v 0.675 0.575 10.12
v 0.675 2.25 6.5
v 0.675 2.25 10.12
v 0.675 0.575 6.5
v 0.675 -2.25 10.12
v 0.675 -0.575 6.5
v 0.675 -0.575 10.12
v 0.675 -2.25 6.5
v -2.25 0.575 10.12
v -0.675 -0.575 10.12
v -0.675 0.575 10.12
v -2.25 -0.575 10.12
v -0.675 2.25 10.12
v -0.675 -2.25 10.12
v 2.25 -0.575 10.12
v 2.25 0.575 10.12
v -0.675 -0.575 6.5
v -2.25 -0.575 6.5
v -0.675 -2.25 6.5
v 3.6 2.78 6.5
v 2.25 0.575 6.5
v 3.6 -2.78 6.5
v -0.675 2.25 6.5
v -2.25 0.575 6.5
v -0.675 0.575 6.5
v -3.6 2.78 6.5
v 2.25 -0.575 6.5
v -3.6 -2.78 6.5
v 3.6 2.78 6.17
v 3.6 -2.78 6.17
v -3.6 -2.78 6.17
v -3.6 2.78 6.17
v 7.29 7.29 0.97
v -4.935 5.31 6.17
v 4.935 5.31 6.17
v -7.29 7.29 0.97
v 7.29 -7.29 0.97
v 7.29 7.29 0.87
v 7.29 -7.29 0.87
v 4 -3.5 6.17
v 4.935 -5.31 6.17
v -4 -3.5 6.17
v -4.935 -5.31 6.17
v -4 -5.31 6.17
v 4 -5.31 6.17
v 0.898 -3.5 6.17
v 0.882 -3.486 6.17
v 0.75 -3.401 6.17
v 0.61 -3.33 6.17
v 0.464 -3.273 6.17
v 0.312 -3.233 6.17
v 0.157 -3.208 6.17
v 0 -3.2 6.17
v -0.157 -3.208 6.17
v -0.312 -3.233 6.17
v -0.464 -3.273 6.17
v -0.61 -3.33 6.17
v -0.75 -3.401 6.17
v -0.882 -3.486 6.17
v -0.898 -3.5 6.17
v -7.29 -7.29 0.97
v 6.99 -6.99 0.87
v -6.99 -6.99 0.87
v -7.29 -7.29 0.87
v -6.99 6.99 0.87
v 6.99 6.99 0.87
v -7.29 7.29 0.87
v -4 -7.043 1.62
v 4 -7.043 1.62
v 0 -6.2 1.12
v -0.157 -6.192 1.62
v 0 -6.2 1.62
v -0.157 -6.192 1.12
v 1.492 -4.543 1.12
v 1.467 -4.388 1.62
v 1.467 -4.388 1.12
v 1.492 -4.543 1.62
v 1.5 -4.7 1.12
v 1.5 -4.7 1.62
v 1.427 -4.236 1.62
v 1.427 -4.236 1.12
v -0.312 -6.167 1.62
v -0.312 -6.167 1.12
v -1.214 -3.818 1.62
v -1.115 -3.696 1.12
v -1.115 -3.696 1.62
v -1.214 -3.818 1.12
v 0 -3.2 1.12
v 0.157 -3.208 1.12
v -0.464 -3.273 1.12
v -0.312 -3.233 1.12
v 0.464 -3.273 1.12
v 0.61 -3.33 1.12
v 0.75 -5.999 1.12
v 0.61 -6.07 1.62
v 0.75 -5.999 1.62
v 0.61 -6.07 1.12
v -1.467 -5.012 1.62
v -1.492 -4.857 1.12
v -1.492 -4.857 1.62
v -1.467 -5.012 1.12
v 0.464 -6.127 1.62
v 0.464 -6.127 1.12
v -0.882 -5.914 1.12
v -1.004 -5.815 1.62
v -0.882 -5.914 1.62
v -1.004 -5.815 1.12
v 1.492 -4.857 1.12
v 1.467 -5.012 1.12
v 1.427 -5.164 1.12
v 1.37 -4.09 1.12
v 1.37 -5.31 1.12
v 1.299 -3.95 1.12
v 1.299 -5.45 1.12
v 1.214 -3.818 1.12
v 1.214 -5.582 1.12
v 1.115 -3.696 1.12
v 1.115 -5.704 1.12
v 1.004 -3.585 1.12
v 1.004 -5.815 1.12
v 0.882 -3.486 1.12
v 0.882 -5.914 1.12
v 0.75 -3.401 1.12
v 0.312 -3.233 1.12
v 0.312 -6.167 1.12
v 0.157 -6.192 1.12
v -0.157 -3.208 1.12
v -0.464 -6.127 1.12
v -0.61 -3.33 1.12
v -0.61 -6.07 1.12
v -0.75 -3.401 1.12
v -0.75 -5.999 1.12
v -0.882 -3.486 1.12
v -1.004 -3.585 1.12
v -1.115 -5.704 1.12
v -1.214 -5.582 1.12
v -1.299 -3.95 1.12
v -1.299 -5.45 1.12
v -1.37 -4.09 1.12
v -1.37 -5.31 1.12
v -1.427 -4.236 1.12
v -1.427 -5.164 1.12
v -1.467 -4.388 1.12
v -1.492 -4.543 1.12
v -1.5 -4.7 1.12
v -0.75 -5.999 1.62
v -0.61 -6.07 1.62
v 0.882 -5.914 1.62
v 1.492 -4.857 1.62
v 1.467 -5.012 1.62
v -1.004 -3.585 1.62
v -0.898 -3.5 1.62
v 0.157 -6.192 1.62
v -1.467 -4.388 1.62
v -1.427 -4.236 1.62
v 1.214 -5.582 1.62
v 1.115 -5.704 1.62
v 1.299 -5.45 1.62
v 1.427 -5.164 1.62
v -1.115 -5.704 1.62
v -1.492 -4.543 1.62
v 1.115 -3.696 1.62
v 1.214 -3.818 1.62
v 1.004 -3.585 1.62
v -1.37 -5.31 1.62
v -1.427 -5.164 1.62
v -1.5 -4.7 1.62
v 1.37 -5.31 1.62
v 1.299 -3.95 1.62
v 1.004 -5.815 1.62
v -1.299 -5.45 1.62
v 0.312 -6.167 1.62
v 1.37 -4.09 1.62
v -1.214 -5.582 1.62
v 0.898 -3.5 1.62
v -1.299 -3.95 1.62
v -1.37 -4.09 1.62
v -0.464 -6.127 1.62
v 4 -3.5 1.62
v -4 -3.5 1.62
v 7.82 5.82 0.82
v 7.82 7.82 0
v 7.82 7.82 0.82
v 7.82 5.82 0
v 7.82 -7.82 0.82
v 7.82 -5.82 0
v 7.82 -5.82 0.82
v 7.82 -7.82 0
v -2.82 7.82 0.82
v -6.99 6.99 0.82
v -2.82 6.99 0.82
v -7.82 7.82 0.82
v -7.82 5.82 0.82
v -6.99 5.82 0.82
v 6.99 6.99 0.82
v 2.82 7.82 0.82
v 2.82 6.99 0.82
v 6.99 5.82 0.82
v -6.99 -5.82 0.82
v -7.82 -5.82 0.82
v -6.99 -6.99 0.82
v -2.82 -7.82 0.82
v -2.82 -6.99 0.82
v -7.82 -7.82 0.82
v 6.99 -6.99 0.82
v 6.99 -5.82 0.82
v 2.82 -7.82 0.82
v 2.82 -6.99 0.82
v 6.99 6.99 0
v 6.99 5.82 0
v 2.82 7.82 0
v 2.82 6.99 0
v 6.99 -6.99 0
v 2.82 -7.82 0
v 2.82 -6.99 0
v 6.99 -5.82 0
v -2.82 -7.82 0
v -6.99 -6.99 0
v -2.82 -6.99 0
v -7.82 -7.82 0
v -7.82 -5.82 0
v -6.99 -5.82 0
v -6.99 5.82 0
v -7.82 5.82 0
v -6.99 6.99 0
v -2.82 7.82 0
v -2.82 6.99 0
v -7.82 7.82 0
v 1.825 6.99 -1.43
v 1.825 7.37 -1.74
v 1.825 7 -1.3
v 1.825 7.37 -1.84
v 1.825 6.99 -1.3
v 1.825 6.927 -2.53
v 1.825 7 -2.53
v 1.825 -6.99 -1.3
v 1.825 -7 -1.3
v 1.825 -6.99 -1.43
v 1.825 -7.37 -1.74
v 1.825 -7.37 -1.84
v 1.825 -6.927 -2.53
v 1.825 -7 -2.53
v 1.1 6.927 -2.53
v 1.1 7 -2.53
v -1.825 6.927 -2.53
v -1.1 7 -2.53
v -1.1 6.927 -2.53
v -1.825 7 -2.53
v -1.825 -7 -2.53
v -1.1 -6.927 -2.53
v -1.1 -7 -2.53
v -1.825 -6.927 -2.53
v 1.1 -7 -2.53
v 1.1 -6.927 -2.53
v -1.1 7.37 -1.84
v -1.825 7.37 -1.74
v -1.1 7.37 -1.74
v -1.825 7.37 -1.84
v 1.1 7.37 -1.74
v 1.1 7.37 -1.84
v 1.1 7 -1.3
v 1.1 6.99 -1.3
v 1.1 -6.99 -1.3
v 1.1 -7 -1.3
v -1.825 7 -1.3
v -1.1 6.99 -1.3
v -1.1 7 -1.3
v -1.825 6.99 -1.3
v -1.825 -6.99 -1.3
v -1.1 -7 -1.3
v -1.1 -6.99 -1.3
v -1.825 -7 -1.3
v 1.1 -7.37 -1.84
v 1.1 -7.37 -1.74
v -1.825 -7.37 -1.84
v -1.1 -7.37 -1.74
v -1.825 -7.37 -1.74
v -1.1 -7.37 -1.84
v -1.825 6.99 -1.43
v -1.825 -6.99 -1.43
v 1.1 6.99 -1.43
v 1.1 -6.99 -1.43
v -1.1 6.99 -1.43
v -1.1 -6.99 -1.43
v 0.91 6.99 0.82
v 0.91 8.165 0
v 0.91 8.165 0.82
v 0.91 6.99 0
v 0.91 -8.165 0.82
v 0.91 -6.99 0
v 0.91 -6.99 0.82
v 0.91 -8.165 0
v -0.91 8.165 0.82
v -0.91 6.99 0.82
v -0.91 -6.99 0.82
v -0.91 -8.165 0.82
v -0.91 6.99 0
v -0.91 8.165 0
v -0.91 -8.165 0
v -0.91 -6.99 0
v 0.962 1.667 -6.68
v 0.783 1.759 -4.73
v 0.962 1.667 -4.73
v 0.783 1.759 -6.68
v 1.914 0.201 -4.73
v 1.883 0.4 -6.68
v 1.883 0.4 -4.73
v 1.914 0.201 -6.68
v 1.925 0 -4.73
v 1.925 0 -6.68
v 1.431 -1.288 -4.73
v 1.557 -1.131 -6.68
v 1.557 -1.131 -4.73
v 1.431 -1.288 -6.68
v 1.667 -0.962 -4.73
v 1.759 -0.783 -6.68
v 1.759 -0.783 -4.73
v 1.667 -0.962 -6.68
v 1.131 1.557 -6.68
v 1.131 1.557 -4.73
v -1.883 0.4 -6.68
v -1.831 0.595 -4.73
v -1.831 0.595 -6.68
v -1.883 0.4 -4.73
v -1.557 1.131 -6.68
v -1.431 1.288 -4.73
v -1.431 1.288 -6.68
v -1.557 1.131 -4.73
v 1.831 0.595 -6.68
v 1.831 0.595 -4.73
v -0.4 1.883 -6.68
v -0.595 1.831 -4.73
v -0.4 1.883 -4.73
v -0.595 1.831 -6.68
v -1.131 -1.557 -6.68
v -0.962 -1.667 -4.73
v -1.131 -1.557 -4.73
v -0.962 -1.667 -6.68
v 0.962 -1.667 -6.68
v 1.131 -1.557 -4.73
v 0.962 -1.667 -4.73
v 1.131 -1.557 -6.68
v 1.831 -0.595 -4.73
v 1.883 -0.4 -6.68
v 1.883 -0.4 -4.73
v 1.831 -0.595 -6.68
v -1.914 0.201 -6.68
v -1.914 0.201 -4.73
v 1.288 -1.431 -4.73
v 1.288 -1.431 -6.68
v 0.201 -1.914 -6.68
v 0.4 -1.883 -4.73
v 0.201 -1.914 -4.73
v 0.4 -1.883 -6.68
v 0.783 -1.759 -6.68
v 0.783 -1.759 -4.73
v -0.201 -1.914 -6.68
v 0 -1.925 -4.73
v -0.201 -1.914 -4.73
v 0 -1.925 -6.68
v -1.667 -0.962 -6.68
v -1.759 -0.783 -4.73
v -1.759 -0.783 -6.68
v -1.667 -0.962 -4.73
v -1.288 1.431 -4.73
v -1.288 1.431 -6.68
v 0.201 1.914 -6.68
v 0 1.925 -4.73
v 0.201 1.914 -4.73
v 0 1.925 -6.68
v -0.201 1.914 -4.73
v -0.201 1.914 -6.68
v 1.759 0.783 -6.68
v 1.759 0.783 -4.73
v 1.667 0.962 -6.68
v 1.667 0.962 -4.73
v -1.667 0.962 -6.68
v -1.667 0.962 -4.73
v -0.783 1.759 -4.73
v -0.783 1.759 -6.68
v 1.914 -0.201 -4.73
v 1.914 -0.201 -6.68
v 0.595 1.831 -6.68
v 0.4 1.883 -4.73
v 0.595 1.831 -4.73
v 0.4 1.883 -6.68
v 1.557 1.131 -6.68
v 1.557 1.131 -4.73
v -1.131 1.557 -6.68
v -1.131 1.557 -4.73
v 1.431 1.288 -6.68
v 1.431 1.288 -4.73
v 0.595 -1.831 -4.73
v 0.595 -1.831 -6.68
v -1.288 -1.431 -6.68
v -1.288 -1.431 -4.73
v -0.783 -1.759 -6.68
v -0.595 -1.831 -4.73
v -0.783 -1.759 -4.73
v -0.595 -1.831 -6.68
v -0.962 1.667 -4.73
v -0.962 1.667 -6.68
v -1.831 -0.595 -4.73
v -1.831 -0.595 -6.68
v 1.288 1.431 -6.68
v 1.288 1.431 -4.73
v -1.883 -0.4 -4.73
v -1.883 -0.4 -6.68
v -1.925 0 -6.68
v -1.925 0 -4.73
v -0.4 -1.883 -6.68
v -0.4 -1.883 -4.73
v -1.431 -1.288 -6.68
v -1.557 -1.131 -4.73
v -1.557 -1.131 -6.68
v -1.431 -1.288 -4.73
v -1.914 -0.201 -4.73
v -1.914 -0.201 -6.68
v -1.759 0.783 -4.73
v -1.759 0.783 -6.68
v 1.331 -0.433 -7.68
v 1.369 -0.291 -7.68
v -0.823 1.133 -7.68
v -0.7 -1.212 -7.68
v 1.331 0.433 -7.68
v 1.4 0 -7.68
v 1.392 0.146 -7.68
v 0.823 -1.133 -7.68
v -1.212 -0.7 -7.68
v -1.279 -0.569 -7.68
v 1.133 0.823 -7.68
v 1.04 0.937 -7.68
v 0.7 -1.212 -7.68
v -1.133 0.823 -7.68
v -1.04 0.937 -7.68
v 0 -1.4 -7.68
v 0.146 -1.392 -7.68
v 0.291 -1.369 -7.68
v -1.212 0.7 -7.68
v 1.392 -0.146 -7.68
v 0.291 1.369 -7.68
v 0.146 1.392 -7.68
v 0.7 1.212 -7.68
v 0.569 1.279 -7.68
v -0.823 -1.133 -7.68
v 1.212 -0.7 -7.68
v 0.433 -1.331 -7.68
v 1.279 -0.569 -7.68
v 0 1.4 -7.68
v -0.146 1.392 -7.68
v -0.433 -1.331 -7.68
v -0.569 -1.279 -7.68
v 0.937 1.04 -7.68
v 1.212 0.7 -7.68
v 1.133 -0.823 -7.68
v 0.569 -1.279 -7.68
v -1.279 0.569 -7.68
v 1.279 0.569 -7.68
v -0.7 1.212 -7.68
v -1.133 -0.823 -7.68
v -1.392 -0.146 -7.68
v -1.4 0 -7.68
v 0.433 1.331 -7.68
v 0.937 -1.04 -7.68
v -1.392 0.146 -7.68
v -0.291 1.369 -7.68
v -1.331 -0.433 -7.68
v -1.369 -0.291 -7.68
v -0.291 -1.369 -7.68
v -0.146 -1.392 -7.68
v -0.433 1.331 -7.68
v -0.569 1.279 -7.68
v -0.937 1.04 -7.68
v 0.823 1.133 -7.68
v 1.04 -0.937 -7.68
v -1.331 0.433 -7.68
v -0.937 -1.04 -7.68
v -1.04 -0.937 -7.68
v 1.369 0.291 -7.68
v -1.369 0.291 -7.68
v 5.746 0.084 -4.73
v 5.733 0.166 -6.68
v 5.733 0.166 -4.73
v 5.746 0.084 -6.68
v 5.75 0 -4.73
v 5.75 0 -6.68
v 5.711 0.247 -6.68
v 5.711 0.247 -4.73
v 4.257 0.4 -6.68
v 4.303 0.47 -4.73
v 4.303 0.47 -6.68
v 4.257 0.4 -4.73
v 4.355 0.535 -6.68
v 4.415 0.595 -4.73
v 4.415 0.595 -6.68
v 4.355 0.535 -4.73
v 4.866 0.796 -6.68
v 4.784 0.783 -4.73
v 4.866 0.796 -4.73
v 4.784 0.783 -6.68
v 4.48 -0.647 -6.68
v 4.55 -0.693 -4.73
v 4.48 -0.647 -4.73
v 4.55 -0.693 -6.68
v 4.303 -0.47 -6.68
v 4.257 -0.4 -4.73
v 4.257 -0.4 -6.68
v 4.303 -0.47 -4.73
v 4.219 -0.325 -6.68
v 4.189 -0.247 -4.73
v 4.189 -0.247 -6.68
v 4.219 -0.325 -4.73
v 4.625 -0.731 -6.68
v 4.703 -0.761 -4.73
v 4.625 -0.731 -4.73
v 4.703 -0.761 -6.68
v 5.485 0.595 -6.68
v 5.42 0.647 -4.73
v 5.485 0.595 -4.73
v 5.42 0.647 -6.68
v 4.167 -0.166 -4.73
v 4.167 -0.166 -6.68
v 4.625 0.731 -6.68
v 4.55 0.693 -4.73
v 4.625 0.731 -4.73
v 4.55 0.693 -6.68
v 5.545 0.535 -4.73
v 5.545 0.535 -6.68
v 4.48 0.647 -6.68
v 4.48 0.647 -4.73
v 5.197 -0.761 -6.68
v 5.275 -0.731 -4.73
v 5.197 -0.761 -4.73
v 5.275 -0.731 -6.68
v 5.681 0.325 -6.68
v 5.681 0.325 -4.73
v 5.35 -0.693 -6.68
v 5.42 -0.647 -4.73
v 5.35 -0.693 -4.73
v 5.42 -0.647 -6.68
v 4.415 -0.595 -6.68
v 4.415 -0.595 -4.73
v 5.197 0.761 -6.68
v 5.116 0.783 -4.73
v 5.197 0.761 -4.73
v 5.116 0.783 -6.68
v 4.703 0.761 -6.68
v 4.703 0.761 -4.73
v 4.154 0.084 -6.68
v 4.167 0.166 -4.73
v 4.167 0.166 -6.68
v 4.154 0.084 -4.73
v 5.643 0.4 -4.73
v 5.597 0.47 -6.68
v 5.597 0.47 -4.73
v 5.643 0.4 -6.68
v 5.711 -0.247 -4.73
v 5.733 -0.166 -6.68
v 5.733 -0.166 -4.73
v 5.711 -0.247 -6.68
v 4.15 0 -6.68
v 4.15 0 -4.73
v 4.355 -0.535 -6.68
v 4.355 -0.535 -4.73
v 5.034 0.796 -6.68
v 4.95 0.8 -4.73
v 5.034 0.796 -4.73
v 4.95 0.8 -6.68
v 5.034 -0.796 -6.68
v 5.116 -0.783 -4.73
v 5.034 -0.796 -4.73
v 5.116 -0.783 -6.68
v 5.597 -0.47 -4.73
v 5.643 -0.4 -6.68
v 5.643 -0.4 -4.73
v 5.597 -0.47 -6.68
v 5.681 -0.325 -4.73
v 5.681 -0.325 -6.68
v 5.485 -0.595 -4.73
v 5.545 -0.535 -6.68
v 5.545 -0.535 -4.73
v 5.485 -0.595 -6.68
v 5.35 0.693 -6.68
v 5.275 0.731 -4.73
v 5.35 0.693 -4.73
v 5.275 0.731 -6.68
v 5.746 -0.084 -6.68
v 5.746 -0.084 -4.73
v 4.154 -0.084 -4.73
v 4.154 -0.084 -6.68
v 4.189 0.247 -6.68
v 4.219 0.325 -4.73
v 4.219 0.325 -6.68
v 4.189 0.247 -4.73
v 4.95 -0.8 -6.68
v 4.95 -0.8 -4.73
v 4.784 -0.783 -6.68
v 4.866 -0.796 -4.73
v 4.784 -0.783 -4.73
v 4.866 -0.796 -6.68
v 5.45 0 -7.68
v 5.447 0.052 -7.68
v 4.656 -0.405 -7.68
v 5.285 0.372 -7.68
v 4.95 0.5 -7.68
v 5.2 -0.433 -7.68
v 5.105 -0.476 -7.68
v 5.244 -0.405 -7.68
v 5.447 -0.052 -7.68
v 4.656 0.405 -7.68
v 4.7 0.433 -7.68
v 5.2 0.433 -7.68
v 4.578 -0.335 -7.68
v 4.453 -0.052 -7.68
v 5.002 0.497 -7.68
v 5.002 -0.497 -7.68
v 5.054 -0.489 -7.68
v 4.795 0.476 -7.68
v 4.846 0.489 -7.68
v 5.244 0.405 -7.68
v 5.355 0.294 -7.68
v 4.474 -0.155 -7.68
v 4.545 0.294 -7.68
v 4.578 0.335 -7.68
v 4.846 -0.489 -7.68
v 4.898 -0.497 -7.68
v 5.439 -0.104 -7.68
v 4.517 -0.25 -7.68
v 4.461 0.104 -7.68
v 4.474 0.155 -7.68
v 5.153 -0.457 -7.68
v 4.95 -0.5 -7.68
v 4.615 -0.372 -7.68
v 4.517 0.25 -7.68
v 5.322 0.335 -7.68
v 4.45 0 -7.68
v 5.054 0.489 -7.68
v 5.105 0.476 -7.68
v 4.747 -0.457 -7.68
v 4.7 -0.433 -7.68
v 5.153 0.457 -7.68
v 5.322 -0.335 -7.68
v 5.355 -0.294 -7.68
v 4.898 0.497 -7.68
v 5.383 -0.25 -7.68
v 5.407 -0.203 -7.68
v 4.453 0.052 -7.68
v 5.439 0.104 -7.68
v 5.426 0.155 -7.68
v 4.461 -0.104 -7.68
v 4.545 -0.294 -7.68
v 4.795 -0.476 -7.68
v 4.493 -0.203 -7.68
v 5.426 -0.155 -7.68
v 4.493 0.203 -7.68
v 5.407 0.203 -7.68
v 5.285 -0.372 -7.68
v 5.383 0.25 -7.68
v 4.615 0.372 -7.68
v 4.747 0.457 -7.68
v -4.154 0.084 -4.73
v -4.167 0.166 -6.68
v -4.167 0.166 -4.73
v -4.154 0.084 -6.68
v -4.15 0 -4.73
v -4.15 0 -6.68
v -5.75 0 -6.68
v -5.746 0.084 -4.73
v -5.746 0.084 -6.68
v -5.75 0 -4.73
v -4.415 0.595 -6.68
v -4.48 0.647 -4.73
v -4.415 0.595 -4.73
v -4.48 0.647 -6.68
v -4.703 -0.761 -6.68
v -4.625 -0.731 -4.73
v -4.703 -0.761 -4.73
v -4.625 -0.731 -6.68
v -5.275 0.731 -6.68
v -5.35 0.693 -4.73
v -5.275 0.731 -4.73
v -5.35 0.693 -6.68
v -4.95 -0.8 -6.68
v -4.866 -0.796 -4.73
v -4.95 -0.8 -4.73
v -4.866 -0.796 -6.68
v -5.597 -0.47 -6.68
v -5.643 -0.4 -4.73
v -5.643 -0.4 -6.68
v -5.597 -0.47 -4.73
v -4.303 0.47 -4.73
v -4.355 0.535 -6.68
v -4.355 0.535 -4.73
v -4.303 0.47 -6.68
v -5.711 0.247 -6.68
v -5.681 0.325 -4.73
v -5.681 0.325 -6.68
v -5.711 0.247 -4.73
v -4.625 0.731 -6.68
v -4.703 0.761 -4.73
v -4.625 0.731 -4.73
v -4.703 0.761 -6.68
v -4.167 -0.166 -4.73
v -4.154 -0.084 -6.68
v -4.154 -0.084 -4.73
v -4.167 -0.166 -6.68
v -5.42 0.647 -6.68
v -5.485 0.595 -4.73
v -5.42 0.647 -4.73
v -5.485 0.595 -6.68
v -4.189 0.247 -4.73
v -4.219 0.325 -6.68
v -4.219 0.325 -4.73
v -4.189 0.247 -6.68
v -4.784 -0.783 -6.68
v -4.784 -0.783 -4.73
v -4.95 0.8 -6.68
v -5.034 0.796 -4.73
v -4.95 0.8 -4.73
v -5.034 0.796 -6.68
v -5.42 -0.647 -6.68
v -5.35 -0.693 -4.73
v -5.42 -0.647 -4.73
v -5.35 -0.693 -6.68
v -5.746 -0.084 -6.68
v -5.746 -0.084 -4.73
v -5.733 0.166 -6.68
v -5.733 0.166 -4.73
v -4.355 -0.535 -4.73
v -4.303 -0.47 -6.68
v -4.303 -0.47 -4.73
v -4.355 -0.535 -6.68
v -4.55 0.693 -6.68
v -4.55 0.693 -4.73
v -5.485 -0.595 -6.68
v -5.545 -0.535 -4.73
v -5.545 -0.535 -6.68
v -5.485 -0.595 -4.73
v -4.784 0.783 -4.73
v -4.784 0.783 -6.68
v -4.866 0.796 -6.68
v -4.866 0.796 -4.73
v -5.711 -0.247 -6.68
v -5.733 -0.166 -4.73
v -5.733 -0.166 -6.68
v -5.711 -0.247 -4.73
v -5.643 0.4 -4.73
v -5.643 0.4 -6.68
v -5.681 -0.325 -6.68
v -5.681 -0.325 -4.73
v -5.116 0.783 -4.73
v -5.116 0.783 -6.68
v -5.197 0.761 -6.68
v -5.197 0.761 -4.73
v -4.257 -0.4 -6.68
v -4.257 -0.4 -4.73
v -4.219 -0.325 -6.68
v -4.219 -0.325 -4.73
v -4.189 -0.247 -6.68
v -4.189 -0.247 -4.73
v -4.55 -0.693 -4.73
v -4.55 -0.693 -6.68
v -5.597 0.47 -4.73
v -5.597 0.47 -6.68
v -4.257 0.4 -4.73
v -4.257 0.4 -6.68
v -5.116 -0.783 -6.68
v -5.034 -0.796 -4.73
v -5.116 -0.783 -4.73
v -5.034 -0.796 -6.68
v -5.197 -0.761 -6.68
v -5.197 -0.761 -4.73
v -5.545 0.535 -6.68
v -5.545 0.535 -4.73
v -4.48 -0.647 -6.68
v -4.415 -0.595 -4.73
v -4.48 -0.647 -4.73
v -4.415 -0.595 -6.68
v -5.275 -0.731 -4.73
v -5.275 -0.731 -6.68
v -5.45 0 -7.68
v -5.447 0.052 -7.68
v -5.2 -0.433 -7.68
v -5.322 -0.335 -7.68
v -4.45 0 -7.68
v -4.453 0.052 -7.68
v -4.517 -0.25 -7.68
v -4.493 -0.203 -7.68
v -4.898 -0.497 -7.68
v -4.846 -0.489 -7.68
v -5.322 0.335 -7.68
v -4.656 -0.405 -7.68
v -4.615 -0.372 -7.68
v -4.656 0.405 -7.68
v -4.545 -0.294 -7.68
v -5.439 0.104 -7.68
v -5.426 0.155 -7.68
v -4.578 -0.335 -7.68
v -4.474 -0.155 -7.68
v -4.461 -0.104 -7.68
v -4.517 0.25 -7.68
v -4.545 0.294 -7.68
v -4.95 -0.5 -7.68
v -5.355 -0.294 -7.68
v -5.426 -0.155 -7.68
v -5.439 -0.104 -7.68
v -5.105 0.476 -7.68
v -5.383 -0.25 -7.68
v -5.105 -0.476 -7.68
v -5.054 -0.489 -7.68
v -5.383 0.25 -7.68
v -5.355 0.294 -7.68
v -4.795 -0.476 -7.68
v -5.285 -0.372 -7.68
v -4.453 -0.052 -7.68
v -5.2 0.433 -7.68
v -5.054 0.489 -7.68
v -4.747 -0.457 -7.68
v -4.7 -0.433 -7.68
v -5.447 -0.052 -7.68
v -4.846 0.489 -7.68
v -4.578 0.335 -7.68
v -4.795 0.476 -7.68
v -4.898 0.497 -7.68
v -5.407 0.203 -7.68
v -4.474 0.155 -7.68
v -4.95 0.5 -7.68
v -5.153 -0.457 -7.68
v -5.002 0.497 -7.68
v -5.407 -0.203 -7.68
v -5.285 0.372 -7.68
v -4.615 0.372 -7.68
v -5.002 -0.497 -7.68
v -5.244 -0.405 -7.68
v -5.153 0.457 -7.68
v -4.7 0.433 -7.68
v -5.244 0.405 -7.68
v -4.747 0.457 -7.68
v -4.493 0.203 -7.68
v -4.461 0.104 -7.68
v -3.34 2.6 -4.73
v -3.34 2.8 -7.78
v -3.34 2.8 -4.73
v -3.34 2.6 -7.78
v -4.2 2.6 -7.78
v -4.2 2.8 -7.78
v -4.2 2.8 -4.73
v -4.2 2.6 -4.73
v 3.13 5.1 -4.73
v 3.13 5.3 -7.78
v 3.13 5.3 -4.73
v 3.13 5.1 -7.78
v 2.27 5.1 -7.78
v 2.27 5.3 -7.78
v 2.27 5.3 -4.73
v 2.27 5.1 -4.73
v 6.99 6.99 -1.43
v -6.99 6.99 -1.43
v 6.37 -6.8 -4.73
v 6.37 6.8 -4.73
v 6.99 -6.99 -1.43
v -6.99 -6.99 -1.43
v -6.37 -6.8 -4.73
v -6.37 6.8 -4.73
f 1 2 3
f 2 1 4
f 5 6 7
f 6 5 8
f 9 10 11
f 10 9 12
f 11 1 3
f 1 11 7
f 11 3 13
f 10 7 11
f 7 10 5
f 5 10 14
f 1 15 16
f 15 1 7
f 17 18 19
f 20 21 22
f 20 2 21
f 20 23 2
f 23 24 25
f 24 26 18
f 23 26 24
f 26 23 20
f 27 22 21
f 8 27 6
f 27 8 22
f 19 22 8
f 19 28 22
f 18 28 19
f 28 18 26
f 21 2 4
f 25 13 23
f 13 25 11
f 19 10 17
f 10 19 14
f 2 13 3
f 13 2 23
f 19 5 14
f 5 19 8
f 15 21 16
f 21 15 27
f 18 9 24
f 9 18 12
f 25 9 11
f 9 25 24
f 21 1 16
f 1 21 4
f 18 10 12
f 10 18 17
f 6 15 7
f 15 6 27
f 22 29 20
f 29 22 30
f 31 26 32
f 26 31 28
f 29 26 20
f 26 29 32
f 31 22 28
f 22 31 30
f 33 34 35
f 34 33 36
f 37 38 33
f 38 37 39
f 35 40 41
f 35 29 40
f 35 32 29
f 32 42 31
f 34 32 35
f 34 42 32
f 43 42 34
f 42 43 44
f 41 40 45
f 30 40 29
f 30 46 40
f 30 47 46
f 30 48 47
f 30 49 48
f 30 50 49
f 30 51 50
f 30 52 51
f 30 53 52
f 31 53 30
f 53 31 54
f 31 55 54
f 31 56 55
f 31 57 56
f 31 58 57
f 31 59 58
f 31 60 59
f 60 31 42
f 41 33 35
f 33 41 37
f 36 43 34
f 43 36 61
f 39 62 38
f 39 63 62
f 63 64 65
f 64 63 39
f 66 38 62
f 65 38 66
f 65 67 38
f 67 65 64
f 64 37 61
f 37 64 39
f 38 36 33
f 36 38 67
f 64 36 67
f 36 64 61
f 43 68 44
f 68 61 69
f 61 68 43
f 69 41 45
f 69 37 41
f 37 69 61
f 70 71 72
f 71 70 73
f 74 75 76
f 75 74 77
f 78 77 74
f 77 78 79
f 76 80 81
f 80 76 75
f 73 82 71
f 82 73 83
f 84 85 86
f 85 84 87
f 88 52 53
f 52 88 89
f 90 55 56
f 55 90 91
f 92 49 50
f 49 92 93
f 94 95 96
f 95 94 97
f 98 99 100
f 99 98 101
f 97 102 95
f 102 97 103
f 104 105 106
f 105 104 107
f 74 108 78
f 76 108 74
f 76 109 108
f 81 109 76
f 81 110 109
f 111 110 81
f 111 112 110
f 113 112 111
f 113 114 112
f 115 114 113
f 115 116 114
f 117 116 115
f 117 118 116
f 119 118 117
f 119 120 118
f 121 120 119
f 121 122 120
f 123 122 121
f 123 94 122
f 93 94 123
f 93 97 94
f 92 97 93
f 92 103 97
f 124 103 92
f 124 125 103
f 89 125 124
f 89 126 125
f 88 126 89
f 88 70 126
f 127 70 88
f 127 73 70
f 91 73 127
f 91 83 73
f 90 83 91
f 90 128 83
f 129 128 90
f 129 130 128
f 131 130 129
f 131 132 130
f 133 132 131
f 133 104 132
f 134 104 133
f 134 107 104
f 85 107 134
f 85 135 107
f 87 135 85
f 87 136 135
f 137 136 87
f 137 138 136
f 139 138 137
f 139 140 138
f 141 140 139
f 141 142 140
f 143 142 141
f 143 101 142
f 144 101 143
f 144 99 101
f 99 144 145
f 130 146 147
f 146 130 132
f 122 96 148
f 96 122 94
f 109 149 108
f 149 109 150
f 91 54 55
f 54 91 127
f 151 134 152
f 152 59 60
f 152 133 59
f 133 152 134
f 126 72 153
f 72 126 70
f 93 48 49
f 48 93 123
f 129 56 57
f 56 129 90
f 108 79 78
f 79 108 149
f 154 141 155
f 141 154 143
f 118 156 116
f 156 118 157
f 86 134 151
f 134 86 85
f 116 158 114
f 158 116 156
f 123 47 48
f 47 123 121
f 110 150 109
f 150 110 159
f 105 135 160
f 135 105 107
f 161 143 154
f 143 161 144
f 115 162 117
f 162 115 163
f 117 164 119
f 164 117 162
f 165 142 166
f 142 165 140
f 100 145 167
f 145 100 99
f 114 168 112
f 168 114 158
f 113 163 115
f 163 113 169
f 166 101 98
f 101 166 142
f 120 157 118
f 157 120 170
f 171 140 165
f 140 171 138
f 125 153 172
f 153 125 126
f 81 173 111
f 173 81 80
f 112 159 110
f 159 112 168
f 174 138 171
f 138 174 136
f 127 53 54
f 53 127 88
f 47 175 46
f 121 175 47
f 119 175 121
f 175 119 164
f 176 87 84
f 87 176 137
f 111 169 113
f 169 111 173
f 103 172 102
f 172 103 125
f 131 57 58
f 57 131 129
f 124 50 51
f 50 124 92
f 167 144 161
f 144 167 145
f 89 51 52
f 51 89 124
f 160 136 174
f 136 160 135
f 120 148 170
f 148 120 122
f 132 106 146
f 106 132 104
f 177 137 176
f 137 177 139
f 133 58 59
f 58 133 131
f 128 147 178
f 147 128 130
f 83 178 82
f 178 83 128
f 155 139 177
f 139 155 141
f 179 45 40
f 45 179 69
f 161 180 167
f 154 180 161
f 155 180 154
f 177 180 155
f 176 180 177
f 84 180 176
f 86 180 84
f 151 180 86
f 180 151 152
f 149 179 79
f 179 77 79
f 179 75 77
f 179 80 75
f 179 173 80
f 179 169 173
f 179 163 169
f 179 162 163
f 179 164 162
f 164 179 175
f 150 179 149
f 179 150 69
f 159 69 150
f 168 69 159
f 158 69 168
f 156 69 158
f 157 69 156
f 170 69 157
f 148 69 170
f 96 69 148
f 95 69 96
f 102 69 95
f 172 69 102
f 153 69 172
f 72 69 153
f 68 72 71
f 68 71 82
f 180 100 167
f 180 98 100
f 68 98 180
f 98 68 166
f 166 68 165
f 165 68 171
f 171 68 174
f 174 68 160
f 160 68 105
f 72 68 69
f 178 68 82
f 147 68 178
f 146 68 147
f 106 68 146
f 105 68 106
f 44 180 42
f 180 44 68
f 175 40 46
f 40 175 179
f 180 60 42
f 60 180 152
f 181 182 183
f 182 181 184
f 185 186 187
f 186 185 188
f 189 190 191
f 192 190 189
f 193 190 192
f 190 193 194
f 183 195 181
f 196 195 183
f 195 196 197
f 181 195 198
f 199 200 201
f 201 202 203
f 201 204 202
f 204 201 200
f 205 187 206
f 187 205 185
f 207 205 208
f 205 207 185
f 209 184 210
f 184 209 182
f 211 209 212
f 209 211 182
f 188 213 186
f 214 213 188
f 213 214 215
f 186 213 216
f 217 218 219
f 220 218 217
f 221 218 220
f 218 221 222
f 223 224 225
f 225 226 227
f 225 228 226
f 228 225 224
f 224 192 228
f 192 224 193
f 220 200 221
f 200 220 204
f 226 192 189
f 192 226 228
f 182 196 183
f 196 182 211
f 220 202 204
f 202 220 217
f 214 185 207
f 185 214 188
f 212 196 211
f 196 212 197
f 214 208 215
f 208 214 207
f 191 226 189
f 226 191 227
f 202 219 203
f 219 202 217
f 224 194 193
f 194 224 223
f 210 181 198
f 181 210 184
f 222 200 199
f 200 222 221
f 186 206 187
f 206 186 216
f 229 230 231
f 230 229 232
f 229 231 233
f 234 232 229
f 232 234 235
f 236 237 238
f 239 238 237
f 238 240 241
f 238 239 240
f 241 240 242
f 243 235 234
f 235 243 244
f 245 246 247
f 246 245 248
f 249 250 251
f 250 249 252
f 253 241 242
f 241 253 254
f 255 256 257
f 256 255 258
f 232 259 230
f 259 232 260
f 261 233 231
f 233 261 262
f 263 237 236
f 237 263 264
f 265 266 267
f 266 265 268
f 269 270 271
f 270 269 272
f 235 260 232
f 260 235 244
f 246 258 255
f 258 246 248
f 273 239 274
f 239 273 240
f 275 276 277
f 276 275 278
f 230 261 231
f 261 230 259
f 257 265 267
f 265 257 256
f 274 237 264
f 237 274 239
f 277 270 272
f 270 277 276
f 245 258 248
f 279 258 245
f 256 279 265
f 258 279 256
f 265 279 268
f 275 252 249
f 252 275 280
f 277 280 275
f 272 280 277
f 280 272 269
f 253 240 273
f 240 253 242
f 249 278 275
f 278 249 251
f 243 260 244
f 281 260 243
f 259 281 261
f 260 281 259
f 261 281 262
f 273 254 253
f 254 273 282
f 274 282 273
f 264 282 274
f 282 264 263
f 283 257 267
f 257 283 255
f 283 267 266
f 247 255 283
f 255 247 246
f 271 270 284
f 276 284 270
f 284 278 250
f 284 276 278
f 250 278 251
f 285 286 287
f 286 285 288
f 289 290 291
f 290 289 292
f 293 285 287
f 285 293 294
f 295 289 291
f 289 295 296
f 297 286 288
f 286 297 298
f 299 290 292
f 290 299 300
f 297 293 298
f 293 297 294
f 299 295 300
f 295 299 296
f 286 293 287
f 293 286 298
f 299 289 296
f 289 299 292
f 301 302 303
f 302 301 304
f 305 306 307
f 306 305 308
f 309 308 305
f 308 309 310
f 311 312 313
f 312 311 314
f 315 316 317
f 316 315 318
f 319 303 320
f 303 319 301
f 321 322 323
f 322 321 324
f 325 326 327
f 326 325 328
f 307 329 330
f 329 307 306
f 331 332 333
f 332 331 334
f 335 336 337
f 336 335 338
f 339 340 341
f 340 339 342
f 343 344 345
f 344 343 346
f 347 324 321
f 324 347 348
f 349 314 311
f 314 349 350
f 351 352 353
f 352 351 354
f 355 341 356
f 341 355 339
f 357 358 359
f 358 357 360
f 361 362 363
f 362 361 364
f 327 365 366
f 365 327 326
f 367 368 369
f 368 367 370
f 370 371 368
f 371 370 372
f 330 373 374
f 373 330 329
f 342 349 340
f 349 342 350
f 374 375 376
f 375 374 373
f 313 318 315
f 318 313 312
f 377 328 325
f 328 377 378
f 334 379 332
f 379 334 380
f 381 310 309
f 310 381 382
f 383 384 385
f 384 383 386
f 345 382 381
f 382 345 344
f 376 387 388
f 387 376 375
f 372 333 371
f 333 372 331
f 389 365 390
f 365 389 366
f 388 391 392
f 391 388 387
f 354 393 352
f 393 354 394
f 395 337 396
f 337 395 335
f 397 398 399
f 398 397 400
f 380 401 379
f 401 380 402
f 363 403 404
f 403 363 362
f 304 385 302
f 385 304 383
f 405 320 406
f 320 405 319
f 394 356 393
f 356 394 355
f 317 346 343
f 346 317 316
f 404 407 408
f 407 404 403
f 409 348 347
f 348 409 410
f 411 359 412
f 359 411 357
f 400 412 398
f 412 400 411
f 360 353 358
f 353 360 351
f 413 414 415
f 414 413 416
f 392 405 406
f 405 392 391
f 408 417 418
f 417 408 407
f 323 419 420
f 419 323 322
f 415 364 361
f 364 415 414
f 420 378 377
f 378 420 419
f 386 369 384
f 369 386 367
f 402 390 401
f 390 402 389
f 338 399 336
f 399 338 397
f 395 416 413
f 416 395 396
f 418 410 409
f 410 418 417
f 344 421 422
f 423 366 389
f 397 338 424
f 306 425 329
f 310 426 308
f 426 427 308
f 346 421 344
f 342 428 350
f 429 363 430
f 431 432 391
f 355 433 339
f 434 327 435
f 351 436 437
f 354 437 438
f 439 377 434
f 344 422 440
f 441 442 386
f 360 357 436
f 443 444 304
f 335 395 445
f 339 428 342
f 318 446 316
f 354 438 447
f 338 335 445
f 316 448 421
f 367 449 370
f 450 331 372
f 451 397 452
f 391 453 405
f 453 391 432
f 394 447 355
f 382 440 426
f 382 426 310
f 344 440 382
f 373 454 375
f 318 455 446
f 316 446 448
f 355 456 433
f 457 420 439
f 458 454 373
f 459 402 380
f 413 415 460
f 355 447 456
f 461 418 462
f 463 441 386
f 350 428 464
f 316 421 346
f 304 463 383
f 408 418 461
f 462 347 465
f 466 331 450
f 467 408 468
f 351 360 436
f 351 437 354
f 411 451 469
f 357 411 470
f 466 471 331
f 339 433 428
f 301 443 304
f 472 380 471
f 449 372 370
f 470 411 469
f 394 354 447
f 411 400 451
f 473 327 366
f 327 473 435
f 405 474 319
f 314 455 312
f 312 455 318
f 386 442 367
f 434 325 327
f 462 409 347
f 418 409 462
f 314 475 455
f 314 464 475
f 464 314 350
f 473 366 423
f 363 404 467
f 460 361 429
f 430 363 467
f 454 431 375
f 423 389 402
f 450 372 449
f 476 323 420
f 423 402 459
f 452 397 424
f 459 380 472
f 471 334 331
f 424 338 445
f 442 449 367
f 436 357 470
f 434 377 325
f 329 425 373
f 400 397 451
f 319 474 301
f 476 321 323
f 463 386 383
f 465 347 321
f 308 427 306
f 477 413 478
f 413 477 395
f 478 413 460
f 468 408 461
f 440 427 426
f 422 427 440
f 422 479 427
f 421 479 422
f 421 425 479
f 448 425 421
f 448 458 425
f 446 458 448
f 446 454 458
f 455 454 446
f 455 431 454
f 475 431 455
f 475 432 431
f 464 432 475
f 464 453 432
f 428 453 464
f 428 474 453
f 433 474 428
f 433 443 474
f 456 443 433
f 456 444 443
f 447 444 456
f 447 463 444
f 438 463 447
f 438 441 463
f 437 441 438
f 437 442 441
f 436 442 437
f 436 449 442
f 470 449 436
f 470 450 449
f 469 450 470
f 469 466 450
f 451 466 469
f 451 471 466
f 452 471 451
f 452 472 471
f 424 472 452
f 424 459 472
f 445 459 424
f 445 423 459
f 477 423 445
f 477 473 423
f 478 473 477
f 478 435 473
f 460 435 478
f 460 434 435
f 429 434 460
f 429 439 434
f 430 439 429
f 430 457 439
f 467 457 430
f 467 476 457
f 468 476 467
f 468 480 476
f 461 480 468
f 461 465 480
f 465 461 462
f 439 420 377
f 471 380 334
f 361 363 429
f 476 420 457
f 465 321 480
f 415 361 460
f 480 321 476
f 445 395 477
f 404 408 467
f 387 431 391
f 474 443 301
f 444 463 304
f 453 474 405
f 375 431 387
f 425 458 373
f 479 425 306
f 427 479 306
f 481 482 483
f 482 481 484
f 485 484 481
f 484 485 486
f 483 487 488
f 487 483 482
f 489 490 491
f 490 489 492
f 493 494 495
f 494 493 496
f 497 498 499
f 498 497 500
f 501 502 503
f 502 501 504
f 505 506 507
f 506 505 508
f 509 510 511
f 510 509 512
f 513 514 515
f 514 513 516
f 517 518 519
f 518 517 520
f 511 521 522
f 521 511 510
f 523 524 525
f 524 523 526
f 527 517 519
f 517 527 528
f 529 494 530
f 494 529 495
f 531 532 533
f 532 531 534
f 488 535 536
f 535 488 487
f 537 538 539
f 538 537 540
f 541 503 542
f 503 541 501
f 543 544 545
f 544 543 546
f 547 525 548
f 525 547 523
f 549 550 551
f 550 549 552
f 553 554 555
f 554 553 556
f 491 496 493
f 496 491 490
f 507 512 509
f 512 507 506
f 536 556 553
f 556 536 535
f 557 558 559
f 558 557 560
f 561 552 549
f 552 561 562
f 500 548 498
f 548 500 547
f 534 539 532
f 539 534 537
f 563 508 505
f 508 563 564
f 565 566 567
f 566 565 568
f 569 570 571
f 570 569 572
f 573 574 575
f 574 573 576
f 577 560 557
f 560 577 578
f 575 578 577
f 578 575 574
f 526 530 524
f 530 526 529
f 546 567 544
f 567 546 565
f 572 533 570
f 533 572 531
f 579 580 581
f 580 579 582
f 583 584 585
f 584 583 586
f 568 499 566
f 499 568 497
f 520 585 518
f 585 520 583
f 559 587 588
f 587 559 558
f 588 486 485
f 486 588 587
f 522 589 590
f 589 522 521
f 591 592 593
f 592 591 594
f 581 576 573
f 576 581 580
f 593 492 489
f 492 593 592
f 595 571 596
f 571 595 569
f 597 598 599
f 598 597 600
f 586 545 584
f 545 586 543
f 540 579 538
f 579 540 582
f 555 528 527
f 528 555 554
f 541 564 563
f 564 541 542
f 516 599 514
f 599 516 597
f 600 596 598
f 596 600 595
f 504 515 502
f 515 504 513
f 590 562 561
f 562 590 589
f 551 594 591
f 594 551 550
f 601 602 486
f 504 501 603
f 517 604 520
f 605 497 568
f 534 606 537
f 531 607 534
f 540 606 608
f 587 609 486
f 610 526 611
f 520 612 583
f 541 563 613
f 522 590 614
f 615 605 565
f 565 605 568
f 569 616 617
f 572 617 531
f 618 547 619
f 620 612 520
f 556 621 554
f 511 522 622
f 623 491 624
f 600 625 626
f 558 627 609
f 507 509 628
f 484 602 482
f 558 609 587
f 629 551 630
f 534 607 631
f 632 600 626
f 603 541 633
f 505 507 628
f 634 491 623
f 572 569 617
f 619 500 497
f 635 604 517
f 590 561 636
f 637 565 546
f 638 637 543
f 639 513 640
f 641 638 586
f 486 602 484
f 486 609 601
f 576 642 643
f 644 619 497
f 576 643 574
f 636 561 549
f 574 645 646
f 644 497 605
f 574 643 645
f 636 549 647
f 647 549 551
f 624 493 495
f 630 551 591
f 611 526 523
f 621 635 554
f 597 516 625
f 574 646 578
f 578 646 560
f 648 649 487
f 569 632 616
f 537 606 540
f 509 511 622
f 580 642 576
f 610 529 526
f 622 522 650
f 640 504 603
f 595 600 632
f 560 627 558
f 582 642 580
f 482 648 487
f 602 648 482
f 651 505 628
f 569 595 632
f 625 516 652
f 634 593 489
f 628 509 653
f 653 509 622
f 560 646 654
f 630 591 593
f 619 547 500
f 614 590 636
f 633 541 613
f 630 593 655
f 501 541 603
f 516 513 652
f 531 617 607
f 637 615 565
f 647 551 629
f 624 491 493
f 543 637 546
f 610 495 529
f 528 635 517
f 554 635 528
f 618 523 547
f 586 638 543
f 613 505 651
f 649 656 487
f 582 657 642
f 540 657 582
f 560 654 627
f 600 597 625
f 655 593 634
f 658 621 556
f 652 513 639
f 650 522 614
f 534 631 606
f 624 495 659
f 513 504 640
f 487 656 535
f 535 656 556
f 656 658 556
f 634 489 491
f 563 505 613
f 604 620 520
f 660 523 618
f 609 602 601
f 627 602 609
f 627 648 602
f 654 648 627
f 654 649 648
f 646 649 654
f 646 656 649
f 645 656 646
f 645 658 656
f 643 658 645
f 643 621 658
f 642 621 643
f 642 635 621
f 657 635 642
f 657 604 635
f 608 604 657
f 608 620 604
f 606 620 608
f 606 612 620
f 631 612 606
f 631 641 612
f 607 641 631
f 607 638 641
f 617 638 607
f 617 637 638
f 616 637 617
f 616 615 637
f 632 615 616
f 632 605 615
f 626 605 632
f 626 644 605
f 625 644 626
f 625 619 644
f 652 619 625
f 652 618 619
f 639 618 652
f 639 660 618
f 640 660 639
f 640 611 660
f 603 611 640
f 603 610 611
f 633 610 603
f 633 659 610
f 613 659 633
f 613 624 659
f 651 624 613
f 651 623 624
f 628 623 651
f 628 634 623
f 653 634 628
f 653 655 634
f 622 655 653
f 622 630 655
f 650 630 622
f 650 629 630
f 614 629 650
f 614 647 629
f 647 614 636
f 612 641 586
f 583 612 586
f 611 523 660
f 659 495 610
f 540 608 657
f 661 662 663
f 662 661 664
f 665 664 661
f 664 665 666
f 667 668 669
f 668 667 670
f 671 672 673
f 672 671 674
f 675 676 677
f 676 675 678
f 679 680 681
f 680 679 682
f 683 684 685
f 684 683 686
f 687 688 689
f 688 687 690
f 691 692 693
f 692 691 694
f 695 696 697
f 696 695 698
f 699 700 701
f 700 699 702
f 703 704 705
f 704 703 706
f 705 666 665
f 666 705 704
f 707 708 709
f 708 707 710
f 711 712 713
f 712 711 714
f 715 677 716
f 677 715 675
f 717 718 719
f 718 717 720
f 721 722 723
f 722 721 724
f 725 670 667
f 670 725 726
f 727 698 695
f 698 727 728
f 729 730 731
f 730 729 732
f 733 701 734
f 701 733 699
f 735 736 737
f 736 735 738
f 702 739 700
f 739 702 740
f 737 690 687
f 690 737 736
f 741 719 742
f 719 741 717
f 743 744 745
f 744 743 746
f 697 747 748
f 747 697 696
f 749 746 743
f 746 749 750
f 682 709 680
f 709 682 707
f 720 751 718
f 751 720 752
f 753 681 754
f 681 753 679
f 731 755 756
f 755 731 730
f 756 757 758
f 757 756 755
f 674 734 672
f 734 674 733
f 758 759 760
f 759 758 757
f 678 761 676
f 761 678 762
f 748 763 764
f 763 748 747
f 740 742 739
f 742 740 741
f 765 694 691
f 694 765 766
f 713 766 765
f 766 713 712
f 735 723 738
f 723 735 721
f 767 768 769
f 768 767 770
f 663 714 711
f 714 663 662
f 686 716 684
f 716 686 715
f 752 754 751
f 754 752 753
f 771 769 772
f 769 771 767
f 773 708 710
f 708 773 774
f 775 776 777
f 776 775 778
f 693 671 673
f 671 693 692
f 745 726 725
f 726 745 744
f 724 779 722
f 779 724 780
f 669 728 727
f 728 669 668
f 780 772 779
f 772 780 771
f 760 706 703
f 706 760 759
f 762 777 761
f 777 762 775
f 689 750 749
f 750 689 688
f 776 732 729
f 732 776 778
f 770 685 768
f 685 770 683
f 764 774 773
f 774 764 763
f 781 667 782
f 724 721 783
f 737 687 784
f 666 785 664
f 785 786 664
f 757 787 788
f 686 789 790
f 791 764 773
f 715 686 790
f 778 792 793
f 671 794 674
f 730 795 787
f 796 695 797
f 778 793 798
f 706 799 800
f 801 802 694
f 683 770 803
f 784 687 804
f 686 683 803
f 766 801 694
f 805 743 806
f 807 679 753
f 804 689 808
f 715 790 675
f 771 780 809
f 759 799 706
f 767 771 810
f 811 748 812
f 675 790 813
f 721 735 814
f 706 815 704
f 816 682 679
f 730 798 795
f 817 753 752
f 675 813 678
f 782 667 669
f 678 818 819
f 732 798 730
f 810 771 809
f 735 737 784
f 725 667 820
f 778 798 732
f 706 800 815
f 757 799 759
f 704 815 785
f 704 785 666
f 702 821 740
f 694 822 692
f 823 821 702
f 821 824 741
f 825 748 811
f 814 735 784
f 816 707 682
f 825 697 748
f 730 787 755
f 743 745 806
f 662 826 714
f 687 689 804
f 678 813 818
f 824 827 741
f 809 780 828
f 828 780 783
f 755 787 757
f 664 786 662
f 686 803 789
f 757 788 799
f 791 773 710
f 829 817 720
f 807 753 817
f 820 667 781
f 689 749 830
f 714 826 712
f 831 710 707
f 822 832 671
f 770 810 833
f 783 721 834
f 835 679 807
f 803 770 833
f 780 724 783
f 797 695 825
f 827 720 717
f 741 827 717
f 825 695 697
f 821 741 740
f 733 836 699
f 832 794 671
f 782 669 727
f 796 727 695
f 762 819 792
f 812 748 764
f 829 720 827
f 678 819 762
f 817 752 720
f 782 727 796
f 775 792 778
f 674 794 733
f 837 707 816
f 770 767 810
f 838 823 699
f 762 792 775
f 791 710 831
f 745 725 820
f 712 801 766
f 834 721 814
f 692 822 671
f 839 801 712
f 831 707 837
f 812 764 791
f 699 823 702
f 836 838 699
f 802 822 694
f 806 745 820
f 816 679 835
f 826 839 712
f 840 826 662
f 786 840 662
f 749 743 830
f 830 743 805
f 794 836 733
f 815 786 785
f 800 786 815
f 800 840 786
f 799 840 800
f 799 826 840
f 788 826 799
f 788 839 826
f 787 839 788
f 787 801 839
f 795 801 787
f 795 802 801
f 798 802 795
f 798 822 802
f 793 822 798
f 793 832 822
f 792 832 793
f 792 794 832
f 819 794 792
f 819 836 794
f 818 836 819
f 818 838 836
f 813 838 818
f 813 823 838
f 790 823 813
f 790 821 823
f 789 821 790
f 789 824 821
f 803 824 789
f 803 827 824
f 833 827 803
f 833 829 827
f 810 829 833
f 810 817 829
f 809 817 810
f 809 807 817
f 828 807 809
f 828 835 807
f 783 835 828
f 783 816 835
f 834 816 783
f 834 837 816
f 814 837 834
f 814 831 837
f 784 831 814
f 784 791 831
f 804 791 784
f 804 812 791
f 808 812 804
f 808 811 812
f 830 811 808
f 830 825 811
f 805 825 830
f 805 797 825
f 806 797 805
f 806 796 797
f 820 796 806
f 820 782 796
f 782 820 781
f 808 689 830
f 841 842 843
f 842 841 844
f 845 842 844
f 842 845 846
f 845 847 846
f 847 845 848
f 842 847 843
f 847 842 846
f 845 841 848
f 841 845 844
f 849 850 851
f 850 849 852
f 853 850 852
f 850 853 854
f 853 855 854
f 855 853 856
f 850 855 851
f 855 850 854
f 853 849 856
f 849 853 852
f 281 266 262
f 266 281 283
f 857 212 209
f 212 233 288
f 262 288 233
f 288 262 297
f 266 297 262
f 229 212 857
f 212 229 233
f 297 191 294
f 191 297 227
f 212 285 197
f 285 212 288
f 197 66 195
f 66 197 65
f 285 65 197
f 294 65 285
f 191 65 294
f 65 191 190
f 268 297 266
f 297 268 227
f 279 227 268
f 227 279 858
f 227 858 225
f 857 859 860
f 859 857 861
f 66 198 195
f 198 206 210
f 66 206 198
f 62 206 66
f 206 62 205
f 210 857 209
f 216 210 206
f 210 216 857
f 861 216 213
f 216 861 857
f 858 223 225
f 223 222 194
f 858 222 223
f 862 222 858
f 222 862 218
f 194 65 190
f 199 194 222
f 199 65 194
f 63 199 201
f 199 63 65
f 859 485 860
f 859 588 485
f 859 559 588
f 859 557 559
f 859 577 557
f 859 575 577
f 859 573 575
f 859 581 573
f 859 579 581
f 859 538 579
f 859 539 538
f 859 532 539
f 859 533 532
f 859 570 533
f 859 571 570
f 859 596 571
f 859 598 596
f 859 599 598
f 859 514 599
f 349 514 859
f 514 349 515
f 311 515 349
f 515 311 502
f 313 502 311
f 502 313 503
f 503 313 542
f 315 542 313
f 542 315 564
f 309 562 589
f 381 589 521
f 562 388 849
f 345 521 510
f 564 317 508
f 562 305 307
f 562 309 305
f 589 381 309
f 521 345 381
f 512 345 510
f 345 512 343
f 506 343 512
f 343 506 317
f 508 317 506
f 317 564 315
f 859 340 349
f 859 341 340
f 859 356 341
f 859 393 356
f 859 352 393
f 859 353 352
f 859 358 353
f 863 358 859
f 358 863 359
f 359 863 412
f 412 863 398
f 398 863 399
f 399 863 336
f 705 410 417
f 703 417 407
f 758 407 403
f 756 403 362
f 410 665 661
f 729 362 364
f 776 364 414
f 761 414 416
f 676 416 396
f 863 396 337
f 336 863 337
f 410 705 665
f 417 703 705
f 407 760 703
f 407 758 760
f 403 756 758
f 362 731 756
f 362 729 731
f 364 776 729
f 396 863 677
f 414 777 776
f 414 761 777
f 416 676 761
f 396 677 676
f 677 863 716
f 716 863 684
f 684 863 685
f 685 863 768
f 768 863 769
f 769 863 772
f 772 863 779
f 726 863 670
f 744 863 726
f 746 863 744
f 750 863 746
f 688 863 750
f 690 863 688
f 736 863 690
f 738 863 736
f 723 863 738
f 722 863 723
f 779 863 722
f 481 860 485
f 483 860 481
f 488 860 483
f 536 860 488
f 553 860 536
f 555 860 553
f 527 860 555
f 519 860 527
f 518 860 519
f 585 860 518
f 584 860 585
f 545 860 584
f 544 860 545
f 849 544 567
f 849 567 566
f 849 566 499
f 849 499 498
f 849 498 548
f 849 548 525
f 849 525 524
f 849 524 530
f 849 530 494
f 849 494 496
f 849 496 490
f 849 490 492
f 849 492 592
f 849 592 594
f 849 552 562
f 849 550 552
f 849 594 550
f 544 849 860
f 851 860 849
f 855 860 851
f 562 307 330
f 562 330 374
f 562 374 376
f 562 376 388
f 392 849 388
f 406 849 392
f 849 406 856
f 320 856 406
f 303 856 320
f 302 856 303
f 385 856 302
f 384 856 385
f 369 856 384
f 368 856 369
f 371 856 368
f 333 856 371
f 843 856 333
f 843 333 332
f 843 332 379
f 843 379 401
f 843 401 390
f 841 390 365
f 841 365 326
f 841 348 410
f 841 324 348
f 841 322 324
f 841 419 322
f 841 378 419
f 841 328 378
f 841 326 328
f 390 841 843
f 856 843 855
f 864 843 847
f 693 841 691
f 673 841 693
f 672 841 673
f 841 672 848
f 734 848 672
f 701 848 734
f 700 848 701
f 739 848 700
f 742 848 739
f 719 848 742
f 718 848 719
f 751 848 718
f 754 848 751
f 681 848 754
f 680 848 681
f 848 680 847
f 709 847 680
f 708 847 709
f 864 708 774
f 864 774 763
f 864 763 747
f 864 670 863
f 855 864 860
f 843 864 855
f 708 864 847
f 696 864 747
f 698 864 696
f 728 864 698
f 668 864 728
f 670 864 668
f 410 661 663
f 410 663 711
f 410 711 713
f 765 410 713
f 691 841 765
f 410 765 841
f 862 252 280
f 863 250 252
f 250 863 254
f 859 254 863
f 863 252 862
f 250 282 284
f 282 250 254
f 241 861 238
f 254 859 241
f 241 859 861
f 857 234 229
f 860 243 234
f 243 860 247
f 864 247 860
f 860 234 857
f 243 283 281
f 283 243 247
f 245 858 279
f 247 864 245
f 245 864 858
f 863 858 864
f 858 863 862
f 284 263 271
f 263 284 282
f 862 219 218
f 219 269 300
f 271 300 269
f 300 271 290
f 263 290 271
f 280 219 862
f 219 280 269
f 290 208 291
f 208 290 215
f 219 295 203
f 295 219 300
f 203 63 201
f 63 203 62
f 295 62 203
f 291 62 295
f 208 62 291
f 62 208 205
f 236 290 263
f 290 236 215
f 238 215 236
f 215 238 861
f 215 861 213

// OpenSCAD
$fn=60;
/**
a cherry mx switch.

most of the measurements done with a caliper. some taken from
http://geekhack.org/index.php?topic=47744.0

This is just to illustrate and to drop in a a gross reference. It is mostly artistic apart from the steam and mounting plate dimensions
*/

// move the whole thing 3mm to give the empty space in usual keycaps.
// that is, the extra space inside a keycap female connector.
// i do that since i create all my keycaps with 0,0,0 being the internal base of the keycap
translate([0,0,4 +5.3 +0.82])
{

	//1. steam
	color("brown"){
		//1.1. l-r tab is 1.35mm
		translate([0,0,-3.62/2])
			cube([1.35,4.5,3.62], center=true);
		//1.2. f-b tab is 1.15mm. it has a smal notch that i will ignore.
		translate([0,0,-3.62/2])
			cube([4.5,1.15,3.62], center=true);
		//1.3. base. it has a chamfered top that i will ignore.
		translate([0,0,-5.62])
			cube([7.2,5.56,4], center=true);
	}
	// 2. top
	color("grey"){
		difference(){
			// make a trapezoid with the general shape (volume?) of the top
			hull(){
				translate([0,0,-4]) //distance from top of switch... some i measured 3.9 others 4.2... so leaving at 4
					cube([9.87,10.62,0.1], center=true);
				translate([0,0,-4 -5.2]) // bottom has a measured 5.3... so move 5.2 and use the 0.1 bellow
					cube([14.58,14.58,0.1], center=true);
			}

		// and subtract:
		// the front led. NOTE: totally off... measured by eye. just for astetics
		// adding just so there is a visual cue of the direction
			translate([0,-4.7,-6])
				cylinder(r=3/2, h=6, center=true);
			translate([0,-5.5,-6])
				cube([8,4,5], center=true);
		// the four corners
			// TODO waste of time? this is all for looks, you shouldn't invade any of that space anyway...
		}
	}

	// 3. bottom
	color("green")
		// 3.1 main body volume
		hull(){
				translate([0,0,-4 -5.3]) //steam + top
					cube([13.98,13.98,0.1], center=true);
				translate([0,0,-4 -5.3 -2.2]) //steam + top + straigth part
					cube([13.98,13.98,0.1], center=true);
				translate([0,0,-4 -5.3 -5.5]) //steam + top + bottom (measured 5.5)
					cube([12.74,13.6,0.1], center=true);
		}
		// 3.2 tabs
		// note: only measured the lenght, if they are slightly off-center, this will be all wrong :)
		color("black")
		difference(){
			translate([0,0,-4 -5.3 -0.82/2]) //steam + top
				cube([15.64,15.64,0.82], center=true);
			translate([0,0,-4 -5.3 -0.82/2  ]) // front-back cut
				cube([5.64,20,0.82 +2], center=true);
			translate([0,0,-4 -5.3 -0.82/2  ]) //side cut
				cube([20,11.64,0.82 +2], center=true);
		}

		// 3.3 tab (plate snap on). to use this mechanically, you have to take into account the bending (as it will move the bottom part slightly up...) just for gross reference here for now
		color("white"){
			// 3.3.1 top
			translate([0,0,-4 -5.3 -0.82/2  ]) // front-back cut
				cube([1.82,16.33,0.82], center=true);
			// 3.3.2 bottom
			difference(){
				hull(){
					translate([0,0,-4 -5.3 -0.82/2 -1.76  ]) // front-back cut
						cube([3.65,14,0.1], center=true);
					translate([0,0,-4 -5.3 -0.82/2 -2.2  ]) // front-back cut
						cube([3.65,14.74,0.1], center=true);
					translate([0,0,-4 -5.3 -0.82/2 -2.89  ]) // front-back cut
						cube([3.65,14,0.1], center=true);
				}
				translate([0,0,-4 -5.3 -0.82/2 -1.76   ]) // front-back cut
					cube([2.2,20,4], center=true);

			}
		}

		// 4. bottom guides
		// again, i'm assuming everything is centered...
		color("darkGreen"){
			// 4.1 cylinder
			translate([0,0,-4 -5.3 -5.5 -2/2]) //steam + top + bottom (measured 5.5)
				cylinder(r=3.85/2, h=2, center=true);
			translate([0,0,-4 -5.3 -5.5 -2 -1/2]) //steam + top + bottom (measured 5.5)
				cylinder(r2=3.85/2, r=2.8/2, h=1, center=true);
			// 4.2 PCB pins
			translate([4.95,0,-4 -5.3 -5.5 -2/2]) //steam + top + bottom (measured 5.5)
				cylinder(r=1.6/2, h=2, center=true);
			translate([4.95,0,-4 -5.3 -5.5 -2 -1/2]) //steam + top + bottom (measured 5.5)
				cylinder(r2=1.6/2, r=1/2, h=1, center=true);
			translate([-4.95,0,-4 -5.3 -5.5 -2/2]) //steam + top + bottom (measured 5.5)
				cylinder(r=1.6/2, h=2, center=true);
			translate([-4.95,0,-4 -5.3 -5.5 -2 -1/2]) //steam + top + bottom (measured 5.5)
				cylinder(r2=1.6/2, r=1/2, h=1, center=true);
		}

		// 5. pins
		color("orange"){
			translate([-3.77,2.7,-4 -5.3 -5.5 -3.1/2]) //steam + top + bottom (measured 5.5)
				cube([.86, 0.2,3.1], center=true);
			translate([2.7,5.2,-4 -5.3 -5.5 -3.1/2]) //steam + top + bottom (measured 5.5)
				cube([.86, 0.2,3.1], center=true);
		}

}
